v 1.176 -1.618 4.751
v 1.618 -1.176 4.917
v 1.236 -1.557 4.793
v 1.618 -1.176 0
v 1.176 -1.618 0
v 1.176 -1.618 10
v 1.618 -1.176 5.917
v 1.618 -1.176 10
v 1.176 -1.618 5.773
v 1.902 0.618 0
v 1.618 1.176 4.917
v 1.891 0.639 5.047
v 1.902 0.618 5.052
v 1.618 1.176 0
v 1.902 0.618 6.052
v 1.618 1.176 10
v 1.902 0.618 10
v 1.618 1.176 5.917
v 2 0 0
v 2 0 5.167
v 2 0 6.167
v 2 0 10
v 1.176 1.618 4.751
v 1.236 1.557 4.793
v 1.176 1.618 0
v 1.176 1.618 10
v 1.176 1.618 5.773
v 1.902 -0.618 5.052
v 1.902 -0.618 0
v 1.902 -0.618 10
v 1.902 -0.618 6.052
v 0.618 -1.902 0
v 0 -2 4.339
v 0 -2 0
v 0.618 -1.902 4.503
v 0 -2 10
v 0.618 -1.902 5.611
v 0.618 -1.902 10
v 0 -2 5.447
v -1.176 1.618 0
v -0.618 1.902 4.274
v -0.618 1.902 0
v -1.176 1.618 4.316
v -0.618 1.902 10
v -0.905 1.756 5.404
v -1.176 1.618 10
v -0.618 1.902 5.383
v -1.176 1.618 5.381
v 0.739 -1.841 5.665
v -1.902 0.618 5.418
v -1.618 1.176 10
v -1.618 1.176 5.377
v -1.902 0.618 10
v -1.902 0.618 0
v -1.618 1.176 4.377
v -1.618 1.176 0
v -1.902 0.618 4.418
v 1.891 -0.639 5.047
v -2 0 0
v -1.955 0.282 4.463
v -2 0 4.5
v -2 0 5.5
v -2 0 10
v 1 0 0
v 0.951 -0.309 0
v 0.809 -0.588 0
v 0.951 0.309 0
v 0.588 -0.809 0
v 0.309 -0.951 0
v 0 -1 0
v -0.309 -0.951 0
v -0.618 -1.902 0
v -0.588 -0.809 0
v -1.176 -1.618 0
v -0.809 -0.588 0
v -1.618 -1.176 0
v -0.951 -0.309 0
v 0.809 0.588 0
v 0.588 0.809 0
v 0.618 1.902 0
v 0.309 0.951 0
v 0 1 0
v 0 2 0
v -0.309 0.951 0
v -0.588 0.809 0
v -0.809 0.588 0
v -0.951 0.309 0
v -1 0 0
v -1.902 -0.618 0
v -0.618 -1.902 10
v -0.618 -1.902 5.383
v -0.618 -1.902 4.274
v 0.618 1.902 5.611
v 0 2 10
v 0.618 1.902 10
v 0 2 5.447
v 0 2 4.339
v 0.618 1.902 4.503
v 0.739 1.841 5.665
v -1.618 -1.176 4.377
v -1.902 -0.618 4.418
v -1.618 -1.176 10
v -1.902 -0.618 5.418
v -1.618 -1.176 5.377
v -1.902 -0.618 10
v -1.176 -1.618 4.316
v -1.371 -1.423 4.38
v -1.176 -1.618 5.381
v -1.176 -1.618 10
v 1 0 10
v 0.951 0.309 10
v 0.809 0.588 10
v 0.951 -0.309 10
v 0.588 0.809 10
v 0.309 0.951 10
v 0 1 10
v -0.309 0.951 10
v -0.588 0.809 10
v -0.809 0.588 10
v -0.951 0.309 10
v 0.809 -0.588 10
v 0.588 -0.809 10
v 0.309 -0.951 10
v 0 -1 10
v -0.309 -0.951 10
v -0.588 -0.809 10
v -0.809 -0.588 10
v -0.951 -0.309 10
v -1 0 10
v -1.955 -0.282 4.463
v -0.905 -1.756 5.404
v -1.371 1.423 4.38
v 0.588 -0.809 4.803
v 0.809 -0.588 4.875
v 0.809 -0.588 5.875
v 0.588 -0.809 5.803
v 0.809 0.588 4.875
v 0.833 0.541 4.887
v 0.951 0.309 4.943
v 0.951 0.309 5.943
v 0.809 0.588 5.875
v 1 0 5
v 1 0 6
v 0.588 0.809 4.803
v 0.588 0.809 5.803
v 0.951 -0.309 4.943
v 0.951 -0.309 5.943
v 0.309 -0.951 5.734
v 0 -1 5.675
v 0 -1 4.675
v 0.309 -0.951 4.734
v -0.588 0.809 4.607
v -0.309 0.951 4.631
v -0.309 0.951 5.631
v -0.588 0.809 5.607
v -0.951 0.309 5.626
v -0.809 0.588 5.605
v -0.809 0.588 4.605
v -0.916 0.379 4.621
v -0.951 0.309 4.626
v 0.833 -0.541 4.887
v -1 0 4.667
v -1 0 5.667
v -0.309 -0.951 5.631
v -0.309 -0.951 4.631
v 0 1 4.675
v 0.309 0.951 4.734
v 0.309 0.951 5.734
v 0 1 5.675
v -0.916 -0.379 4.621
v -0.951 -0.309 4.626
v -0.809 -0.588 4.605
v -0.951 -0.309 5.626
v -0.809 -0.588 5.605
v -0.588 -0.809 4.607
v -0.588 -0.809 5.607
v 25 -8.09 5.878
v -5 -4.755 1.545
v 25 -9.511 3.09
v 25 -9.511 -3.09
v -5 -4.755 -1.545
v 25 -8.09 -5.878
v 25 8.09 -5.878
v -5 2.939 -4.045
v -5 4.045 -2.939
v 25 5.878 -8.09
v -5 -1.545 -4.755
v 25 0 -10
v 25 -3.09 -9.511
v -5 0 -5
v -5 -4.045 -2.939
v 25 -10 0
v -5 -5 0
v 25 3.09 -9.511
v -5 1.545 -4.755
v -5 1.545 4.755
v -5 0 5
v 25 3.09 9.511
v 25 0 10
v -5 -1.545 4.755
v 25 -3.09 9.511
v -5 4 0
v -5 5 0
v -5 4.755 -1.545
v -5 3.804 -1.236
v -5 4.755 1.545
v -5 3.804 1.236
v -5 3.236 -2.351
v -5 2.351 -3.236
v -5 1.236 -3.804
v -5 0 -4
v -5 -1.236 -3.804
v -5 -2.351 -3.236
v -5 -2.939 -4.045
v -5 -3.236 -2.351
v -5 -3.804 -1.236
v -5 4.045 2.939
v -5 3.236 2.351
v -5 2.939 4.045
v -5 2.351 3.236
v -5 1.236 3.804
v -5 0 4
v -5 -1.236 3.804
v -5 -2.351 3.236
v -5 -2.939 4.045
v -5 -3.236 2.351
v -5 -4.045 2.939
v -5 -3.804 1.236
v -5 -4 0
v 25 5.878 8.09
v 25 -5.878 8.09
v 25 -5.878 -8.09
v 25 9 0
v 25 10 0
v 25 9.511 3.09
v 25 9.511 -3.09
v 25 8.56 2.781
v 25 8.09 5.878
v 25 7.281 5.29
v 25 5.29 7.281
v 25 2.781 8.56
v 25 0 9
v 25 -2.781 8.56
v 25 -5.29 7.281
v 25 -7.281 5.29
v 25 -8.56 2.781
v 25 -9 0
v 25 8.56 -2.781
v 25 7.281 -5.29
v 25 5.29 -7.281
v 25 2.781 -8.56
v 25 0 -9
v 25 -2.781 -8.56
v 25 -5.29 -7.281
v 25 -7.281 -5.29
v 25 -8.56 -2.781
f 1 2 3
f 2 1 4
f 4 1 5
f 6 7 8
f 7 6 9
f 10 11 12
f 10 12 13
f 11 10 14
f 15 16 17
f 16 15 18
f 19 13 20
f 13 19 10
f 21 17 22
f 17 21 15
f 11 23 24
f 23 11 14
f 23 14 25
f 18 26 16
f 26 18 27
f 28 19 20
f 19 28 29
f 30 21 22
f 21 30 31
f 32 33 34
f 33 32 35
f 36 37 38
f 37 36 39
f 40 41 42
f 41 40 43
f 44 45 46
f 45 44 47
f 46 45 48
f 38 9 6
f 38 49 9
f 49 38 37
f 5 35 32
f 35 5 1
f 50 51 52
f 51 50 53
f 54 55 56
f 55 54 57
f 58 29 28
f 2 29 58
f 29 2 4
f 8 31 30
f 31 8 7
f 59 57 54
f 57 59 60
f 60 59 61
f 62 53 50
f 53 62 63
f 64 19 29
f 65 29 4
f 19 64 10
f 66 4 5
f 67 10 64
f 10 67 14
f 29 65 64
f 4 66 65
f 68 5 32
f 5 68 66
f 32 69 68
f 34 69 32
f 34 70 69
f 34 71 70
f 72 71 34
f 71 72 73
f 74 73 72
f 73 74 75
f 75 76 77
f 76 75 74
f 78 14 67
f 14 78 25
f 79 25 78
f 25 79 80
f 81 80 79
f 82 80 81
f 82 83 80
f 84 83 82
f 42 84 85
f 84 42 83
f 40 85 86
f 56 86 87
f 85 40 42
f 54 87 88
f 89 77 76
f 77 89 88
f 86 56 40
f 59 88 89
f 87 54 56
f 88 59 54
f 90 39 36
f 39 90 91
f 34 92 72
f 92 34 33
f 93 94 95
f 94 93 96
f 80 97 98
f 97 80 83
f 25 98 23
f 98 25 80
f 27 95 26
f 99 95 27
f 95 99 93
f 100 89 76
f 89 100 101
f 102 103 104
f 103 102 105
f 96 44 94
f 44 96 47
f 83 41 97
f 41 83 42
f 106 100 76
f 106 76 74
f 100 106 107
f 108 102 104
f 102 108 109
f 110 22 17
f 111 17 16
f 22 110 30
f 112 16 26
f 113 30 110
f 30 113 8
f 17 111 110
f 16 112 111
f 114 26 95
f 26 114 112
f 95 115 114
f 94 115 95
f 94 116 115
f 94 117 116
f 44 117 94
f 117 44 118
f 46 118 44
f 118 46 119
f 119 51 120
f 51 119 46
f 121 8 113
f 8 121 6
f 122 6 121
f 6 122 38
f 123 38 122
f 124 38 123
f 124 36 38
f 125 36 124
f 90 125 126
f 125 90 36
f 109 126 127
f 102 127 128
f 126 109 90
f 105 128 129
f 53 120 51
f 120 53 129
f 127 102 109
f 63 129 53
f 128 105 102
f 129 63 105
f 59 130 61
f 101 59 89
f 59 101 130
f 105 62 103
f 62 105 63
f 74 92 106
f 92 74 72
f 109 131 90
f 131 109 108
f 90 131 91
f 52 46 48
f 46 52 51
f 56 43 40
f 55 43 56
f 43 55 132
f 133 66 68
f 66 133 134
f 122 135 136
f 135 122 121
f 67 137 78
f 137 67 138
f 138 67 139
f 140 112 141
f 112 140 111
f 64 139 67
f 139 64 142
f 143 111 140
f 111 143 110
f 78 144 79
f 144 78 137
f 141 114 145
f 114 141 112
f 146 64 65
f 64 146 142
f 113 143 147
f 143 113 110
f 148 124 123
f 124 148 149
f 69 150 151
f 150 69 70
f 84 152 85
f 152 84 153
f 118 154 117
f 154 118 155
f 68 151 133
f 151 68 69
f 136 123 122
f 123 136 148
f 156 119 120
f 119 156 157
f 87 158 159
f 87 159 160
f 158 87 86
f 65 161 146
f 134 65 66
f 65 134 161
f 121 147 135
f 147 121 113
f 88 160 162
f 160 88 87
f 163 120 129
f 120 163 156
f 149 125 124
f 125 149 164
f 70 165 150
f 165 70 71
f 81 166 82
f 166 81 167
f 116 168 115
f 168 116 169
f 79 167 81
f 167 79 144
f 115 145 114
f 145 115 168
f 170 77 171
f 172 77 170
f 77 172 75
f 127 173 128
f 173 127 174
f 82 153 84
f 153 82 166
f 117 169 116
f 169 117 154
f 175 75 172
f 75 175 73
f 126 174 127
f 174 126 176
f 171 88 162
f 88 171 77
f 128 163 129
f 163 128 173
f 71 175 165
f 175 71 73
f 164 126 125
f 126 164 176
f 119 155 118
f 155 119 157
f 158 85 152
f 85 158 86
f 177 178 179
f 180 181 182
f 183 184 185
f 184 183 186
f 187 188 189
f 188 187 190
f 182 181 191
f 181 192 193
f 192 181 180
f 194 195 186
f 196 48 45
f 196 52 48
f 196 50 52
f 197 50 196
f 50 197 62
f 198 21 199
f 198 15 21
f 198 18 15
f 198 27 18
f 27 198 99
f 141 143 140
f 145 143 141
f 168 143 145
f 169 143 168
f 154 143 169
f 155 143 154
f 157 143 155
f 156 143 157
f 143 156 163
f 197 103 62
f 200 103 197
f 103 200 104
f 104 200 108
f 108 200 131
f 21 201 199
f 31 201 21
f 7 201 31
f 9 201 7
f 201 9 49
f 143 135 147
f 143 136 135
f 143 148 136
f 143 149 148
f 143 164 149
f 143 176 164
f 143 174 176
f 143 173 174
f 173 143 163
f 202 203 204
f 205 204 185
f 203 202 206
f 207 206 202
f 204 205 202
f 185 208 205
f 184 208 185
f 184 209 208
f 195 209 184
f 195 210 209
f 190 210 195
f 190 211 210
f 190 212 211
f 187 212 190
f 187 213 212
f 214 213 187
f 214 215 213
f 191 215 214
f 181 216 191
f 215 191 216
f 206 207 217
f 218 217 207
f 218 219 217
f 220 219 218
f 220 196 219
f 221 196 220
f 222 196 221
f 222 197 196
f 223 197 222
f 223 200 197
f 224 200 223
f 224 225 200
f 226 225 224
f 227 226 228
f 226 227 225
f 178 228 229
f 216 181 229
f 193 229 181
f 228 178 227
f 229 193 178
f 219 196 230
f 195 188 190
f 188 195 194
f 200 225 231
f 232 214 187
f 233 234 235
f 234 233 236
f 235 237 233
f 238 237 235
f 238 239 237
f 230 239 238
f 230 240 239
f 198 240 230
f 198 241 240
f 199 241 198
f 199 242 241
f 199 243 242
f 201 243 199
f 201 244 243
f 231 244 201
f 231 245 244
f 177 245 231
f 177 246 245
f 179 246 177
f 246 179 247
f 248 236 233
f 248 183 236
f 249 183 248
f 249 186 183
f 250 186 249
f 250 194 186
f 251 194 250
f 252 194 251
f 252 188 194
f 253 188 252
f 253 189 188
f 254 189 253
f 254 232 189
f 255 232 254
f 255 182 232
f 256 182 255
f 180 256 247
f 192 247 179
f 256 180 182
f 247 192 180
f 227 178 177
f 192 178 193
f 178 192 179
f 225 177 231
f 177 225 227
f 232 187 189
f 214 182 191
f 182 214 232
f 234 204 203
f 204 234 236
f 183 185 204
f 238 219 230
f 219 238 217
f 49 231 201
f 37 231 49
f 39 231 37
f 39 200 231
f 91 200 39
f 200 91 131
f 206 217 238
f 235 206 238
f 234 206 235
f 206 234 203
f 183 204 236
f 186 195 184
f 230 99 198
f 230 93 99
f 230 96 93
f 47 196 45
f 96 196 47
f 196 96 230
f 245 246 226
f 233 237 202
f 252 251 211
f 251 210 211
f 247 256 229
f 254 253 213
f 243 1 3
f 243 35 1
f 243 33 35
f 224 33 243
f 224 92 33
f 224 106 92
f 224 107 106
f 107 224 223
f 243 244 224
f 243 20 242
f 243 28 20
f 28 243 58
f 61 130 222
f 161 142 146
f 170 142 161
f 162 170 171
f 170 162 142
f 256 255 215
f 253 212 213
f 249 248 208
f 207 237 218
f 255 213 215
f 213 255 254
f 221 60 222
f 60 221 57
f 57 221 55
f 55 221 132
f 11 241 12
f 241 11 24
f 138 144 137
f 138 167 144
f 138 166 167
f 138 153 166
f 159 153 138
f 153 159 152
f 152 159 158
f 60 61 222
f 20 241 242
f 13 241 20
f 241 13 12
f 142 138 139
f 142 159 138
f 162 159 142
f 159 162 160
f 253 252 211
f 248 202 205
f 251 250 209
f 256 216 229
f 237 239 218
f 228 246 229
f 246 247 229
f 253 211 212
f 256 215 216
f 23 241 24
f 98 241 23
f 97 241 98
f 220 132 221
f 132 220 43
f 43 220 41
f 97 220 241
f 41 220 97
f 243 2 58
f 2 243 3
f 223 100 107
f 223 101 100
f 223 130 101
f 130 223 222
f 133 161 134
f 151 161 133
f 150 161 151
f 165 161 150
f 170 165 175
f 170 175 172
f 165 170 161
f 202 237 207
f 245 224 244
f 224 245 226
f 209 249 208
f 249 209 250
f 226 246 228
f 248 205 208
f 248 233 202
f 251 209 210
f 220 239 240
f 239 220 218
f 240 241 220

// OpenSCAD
$fn = 20;


difference() {
    cylinder(h=10, r=2);
    cylinder(h=10, r=1);
}


difference() {
    translate([-5, 0]) rotate([0,90])   cylinder(r1=5, r2=10, h=30);
    translate([-5, 0]) rotate([0,90])   cylinder(r1=4, r2=9, h=30);
}
